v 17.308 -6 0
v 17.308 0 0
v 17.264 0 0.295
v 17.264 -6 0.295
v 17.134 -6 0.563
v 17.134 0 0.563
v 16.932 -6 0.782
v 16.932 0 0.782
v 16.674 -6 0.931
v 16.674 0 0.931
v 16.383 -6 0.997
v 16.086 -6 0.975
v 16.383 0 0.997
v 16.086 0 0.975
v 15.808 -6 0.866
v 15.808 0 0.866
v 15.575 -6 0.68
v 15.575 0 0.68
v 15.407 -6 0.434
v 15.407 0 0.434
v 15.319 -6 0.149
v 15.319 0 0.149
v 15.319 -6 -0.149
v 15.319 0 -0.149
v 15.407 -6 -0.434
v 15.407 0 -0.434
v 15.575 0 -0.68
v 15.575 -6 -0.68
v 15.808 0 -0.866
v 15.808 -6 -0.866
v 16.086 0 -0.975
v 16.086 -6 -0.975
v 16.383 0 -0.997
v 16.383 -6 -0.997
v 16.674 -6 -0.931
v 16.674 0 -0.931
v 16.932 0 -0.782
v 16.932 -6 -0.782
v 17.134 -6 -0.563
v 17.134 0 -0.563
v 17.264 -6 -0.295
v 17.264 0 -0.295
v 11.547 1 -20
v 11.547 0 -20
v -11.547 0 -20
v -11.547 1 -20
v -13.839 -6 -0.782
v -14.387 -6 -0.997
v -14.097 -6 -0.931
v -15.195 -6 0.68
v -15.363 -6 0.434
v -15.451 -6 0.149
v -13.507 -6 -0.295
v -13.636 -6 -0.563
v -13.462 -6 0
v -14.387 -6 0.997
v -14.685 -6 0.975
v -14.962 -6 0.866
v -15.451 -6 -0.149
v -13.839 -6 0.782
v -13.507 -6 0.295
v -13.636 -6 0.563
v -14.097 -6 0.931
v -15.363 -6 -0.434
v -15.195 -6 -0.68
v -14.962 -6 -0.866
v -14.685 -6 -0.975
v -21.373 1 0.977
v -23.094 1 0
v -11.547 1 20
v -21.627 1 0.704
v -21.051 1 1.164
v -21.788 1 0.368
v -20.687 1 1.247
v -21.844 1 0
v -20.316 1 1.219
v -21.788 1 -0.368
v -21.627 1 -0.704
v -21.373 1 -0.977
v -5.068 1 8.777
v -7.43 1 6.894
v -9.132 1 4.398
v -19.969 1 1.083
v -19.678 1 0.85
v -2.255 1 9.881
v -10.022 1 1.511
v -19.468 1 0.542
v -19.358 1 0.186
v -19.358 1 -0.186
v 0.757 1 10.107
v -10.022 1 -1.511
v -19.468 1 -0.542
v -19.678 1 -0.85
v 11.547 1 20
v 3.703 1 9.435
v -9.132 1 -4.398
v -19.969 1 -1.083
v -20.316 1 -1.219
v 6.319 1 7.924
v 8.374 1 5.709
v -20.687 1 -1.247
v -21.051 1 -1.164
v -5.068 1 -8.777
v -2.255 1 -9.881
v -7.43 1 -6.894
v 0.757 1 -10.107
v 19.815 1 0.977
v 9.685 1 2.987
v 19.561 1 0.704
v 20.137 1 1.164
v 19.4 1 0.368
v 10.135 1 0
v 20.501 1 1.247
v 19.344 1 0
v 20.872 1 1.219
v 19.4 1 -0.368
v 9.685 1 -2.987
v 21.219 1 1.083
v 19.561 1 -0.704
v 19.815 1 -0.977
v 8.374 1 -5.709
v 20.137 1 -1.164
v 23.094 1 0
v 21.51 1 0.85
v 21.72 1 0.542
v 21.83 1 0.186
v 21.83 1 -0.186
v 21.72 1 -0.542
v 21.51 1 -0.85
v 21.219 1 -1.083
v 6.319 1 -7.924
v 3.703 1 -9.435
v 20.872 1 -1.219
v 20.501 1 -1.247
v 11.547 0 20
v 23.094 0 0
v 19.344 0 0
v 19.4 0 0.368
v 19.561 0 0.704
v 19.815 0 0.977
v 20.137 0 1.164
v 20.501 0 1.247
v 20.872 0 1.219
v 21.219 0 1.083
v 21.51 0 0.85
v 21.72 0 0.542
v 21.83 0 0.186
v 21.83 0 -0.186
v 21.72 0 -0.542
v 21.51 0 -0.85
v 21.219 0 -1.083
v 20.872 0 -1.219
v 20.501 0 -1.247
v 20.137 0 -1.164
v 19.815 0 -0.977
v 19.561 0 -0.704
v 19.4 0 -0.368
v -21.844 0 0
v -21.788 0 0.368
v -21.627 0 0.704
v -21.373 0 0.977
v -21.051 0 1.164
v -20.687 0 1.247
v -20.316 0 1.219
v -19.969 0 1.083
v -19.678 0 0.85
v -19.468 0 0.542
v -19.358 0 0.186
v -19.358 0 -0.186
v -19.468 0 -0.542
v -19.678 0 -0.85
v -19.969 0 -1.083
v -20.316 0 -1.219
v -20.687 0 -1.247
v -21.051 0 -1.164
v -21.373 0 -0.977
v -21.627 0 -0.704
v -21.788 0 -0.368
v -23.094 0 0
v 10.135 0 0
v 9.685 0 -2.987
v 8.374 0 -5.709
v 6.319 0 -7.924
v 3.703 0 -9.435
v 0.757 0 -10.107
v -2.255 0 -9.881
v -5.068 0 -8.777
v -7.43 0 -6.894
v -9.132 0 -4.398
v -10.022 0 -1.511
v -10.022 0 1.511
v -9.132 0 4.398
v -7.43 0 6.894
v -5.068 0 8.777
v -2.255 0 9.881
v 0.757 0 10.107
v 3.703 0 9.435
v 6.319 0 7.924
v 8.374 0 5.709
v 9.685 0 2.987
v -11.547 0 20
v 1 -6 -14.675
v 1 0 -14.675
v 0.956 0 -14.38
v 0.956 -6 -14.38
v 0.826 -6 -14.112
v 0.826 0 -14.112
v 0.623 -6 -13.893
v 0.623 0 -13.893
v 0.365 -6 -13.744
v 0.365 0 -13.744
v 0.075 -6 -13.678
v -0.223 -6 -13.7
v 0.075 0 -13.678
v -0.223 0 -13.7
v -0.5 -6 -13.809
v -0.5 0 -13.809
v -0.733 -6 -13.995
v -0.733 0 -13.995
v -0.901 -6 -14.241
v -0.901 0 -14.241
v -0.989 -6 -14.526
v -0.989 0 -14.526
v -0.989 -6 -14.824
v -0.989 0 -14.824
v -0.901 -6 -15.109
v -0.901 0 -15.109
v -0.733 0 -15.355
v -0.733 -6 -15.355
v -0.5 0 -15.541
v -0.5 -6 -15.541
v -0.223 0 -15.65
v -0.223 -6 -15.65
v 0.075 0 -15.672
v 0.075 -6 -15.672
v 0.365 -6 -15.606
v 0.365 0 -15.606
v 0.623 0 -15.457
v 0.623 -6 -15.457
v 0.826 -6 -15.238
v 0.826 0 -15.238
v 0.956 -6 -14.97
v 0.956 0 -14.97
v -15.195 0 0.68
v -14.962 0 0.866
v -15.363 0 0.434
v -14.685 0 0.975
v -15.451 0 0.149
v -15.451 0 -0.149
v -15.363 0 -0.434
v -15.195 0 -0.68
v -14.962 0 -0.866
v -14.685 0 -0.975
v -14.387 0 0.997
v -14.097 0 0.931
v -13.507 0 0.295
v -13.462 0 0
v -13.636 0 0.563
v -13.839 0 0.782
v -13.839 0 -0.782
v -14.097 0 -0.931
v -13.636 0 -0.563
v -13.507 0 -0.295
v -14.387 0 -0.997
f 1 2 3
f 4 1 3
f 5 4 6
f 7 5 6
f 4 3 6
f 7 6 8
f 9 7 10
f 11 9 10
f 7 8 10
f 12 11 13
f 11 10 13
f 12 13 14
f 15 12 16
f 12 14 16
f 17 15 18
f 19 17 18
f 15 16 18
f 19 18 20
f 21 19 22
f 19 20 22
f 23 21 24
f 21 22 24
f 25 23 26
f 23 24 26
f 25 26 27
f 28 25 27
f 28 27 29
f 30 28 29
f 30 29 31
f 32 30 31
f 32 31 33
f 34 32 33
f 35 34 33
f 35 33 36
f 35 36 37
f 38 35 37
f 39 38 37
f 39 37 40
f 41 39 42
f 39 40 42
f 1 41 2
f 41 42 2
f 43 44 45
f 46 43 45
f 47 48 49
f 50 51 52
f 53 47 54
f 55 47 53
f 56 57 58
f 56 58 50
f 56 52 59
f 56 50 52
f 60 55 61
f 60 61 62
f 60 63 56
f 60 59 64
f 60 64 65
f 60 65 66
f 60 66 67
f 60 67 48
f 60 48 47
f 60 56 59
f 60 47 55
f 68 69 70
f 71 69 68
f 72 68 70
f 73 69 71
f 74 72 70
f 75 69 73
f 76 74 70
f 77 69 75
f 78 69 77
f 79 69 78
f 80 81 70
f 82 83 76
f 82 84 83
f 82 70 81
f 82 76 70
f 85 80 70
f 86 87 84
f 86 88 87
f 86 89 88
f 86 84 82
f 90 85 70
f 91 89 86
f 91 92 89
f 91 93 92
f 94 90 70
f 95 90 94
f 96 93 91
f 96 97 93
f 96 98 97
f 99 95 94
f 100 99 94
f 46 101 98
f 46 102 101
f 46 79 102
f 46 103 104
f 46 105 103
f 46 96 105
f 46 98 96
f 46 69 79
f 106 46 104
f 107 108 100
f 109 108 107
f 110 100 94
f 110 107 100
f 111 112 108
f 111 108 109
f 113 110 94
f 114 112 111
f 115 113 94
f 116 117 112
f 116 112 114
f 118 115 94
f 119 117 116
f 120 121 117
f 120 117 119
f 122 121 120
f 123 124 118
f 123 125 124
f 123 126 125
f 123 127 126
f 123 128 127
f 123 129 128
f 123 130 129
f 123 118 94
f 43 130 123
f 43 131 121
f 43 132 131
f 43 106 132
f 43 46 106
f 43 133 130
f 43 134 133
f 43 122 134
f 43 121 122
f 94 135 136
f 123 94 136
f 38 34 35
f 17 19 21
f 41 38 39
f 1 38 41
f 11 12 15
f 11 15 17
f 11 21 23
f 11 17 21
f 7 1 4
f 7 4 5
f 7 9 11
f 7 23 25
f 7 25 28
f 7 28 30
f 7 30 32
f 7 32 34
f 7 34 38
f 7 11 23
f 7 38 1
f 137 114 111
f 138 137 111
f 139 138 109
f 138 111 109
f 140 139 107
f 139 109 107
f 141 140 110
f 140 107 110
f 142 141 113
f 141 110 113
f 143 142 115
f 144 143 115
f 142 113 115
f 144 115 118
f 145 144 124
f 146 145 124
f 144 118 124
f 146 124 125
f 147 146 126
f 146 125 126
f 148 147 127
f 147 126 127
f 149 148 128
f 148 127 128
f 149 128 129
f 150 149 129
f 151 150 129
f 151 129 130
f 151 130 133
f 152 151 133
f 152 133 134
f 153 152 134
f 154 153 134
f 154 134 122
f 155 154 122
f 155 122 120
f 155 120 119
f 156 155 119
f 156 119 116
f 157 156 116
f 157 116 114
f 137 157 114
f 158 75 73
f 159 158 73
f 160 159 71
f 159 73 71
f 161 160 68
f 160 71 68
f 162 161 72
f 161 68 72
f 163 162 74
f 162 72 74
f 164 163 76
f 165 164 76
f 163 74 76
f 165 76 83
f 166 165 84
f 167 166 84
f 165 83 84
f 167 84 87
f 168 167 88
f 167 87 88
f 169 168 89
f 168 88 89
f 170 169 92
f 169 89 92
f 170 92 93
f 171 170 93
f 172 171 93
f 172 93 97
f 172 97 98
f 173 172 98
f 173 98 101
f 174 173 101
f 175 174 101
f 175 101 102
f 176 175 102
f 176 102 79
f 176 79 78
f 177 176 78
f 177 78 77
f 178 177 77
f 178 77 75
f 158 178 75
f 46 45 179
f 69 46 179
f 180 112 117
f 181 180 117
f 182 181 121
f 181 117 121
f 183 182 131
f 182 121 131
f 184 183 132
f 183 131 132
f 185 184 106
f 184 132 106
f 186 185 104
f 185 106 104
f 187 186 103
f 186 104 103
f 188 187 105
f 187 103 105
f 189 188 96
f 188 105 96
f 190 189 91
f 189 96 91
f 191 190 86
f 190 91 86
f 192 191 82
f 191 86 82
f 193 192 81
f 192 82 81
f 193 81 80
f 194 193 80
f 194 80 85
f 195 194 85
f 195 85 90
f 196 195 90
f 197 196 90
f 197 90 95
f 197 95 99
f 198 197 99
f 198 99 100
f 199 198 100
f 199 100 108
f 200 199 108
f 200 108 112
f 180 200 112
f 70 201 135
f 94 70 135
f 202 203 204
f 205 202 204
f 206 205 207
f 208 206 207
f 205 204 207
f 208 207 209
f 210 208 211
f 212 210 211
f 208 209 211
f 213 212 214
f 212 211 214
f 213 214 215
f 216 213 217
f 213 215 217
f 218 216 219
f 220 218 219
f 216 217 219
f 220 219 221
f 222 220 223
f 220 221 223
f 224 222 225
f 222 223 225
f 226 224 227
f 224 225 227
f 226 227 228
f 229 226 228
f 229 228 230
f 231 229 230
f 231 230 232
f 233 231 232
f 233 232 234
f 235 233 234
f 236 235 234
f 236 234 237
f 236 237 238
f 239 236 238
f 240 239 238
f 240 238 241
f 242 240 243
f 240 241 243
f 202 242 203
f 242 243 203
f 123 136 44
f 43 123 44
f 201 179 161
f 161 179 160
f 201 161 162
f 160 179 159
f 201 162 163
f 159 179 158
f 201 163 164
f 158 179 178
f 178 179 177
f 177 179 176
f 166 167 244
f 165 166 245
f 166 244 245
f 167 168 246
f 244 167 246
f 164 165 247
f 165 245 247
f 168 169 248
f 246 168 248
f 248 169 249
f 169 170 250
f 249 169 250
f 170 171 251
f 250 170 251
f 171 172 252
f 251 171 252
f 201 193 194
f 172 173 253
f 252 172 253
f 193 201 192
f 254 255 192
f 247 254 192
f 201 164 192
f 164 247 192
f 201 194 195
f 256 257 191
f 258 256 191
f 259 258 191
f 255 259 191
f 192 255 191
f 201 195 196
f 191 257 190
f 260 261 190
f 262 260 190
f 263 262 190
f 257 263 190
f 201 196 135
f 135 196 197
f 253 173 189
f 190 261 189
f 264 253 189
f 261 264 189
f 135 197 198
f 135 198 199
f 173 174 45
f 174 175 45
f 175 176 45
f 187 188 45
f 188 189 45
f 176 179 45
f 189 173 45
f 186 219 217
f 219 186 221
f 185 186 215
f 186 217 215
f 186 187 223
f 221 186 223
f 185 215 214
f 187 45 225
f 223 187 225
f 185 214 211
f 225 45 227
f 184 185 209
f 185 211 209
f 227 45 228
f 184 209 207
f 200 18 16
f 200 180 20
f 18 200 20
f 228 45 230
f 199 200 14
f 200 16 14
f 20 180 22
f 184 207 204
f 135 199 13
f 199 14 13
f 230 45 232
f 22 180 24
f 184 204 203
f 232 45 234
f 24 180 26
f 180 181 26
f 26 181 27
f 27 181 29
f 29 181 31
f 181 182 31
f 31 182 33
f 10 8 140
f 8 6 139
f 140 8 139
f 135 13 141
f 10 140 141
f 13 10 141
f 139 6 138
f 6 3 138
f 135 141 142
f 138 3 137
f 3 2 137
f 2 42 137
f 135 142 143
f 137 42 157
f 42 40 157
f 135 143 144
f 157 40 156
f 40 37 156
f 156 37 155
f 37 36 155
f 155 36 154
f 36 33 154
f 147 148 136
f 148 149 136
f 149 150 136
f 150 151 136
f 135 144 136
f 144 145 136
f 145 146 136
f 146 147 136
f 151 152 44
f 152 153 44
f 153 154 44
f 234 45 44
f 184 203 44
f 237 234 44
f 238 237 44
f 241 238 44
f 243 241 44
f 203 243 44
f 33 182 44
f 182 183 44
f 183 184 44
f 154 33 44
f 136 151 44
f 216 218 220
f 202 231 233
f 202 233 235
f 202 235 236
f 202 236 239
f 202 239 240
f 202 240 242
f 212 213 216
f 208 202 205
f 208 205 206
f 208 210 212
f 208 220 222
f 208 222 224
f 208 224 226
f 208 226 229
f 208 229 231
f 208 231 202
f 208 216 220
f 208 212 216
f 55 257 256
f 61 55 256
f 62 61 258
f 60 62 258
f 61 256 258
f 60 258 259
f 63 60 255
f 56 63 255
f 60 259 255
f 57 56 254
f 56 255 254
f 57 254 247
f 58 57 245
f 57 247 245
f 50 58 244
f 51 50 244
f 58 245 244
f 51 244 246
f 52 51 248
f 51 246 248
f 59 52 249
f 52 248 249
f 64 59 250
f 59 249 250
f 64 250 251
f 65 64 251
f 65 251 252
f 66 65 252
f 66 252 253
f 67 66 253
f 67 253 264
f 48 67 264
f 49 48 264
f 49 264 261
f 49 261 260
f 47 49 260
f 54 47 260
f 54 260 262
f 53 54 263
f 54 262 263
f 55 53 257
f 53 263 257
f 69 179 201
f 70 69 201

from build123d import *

# Parameters (mm, degrees)
BOSS_EXTRUDE1_DEPTH = 1
SKETCH3_R           = 1
BOSS_EXTRUDE2_DEPTH = 6
SKETCH4_R           = 10.135267165
CUT_EXTRUDE1_DEPTH  = 6
SKETCH5_R           = 1.25
CUT_EXTRUDE2_DEPTH  = 15


with BuildPart() as part:
    # Sketch1 → Boss-Extrude1 (new body)
    with BuildSketch(Plane(origin=(0, 0, 0), x_dir=(1, 0, 0), z_dir=(0, 1, 0))):
        Polygon((23.094010768, 0), (11.547005384, 20), (-11.547005384, 20), (-23.094010768, 0), (-11.547005384, -20), (11.547005384, -20), align=None)
    extrude(amount=BOSS_EXTRUDE1_DEPTH)

    # Sketch3 → Boss-Extrude2 (add)
    with BuildSketch(Plane.XZ):
        with Locations((16.308163565, 0)):
            Circle(SKETCH3_R)
        with Locations((-14.462214845, 0)):
            Circle(SKETCH3_R)
        with Locations((0, -14.675000966)):
            Circle(SKETCH3_R)
    extrude(amount=BOSS_EXTRUDE2_DEPTH)

    # Sketch4 → Cut-Extrude1 (cut)
    with BuildSketch(Plane(origin=(0, 1, 0), x_dir=(1, 0, 0), z_dir=(0, 1, 0))):
        Circle(SKETCH4_R)
    extrude(amount=-CUT_EXTRUDE1_DEPTH, mode=Mode.SUBTRACT)

    # Sketch5 → Cut-Extrude2 (cut)
    with BuildSketch(Plane(origin=(19.371137685, 1, -19.368583248), x_dir=(-1, 0, 0), z_dir=(0, 1, 0))):
        with Locations((-1.222873082, 19.368583248)):
            Circle(SKETCH5_R)
        with Locations((39.965148453, 19.368583248)):
            Circle(SKETCH5_R)
    extrude(amount=-CUT_EXTRUDE2_DEPTH, mode=Mode.SUBTRACT)


solid = part.part
